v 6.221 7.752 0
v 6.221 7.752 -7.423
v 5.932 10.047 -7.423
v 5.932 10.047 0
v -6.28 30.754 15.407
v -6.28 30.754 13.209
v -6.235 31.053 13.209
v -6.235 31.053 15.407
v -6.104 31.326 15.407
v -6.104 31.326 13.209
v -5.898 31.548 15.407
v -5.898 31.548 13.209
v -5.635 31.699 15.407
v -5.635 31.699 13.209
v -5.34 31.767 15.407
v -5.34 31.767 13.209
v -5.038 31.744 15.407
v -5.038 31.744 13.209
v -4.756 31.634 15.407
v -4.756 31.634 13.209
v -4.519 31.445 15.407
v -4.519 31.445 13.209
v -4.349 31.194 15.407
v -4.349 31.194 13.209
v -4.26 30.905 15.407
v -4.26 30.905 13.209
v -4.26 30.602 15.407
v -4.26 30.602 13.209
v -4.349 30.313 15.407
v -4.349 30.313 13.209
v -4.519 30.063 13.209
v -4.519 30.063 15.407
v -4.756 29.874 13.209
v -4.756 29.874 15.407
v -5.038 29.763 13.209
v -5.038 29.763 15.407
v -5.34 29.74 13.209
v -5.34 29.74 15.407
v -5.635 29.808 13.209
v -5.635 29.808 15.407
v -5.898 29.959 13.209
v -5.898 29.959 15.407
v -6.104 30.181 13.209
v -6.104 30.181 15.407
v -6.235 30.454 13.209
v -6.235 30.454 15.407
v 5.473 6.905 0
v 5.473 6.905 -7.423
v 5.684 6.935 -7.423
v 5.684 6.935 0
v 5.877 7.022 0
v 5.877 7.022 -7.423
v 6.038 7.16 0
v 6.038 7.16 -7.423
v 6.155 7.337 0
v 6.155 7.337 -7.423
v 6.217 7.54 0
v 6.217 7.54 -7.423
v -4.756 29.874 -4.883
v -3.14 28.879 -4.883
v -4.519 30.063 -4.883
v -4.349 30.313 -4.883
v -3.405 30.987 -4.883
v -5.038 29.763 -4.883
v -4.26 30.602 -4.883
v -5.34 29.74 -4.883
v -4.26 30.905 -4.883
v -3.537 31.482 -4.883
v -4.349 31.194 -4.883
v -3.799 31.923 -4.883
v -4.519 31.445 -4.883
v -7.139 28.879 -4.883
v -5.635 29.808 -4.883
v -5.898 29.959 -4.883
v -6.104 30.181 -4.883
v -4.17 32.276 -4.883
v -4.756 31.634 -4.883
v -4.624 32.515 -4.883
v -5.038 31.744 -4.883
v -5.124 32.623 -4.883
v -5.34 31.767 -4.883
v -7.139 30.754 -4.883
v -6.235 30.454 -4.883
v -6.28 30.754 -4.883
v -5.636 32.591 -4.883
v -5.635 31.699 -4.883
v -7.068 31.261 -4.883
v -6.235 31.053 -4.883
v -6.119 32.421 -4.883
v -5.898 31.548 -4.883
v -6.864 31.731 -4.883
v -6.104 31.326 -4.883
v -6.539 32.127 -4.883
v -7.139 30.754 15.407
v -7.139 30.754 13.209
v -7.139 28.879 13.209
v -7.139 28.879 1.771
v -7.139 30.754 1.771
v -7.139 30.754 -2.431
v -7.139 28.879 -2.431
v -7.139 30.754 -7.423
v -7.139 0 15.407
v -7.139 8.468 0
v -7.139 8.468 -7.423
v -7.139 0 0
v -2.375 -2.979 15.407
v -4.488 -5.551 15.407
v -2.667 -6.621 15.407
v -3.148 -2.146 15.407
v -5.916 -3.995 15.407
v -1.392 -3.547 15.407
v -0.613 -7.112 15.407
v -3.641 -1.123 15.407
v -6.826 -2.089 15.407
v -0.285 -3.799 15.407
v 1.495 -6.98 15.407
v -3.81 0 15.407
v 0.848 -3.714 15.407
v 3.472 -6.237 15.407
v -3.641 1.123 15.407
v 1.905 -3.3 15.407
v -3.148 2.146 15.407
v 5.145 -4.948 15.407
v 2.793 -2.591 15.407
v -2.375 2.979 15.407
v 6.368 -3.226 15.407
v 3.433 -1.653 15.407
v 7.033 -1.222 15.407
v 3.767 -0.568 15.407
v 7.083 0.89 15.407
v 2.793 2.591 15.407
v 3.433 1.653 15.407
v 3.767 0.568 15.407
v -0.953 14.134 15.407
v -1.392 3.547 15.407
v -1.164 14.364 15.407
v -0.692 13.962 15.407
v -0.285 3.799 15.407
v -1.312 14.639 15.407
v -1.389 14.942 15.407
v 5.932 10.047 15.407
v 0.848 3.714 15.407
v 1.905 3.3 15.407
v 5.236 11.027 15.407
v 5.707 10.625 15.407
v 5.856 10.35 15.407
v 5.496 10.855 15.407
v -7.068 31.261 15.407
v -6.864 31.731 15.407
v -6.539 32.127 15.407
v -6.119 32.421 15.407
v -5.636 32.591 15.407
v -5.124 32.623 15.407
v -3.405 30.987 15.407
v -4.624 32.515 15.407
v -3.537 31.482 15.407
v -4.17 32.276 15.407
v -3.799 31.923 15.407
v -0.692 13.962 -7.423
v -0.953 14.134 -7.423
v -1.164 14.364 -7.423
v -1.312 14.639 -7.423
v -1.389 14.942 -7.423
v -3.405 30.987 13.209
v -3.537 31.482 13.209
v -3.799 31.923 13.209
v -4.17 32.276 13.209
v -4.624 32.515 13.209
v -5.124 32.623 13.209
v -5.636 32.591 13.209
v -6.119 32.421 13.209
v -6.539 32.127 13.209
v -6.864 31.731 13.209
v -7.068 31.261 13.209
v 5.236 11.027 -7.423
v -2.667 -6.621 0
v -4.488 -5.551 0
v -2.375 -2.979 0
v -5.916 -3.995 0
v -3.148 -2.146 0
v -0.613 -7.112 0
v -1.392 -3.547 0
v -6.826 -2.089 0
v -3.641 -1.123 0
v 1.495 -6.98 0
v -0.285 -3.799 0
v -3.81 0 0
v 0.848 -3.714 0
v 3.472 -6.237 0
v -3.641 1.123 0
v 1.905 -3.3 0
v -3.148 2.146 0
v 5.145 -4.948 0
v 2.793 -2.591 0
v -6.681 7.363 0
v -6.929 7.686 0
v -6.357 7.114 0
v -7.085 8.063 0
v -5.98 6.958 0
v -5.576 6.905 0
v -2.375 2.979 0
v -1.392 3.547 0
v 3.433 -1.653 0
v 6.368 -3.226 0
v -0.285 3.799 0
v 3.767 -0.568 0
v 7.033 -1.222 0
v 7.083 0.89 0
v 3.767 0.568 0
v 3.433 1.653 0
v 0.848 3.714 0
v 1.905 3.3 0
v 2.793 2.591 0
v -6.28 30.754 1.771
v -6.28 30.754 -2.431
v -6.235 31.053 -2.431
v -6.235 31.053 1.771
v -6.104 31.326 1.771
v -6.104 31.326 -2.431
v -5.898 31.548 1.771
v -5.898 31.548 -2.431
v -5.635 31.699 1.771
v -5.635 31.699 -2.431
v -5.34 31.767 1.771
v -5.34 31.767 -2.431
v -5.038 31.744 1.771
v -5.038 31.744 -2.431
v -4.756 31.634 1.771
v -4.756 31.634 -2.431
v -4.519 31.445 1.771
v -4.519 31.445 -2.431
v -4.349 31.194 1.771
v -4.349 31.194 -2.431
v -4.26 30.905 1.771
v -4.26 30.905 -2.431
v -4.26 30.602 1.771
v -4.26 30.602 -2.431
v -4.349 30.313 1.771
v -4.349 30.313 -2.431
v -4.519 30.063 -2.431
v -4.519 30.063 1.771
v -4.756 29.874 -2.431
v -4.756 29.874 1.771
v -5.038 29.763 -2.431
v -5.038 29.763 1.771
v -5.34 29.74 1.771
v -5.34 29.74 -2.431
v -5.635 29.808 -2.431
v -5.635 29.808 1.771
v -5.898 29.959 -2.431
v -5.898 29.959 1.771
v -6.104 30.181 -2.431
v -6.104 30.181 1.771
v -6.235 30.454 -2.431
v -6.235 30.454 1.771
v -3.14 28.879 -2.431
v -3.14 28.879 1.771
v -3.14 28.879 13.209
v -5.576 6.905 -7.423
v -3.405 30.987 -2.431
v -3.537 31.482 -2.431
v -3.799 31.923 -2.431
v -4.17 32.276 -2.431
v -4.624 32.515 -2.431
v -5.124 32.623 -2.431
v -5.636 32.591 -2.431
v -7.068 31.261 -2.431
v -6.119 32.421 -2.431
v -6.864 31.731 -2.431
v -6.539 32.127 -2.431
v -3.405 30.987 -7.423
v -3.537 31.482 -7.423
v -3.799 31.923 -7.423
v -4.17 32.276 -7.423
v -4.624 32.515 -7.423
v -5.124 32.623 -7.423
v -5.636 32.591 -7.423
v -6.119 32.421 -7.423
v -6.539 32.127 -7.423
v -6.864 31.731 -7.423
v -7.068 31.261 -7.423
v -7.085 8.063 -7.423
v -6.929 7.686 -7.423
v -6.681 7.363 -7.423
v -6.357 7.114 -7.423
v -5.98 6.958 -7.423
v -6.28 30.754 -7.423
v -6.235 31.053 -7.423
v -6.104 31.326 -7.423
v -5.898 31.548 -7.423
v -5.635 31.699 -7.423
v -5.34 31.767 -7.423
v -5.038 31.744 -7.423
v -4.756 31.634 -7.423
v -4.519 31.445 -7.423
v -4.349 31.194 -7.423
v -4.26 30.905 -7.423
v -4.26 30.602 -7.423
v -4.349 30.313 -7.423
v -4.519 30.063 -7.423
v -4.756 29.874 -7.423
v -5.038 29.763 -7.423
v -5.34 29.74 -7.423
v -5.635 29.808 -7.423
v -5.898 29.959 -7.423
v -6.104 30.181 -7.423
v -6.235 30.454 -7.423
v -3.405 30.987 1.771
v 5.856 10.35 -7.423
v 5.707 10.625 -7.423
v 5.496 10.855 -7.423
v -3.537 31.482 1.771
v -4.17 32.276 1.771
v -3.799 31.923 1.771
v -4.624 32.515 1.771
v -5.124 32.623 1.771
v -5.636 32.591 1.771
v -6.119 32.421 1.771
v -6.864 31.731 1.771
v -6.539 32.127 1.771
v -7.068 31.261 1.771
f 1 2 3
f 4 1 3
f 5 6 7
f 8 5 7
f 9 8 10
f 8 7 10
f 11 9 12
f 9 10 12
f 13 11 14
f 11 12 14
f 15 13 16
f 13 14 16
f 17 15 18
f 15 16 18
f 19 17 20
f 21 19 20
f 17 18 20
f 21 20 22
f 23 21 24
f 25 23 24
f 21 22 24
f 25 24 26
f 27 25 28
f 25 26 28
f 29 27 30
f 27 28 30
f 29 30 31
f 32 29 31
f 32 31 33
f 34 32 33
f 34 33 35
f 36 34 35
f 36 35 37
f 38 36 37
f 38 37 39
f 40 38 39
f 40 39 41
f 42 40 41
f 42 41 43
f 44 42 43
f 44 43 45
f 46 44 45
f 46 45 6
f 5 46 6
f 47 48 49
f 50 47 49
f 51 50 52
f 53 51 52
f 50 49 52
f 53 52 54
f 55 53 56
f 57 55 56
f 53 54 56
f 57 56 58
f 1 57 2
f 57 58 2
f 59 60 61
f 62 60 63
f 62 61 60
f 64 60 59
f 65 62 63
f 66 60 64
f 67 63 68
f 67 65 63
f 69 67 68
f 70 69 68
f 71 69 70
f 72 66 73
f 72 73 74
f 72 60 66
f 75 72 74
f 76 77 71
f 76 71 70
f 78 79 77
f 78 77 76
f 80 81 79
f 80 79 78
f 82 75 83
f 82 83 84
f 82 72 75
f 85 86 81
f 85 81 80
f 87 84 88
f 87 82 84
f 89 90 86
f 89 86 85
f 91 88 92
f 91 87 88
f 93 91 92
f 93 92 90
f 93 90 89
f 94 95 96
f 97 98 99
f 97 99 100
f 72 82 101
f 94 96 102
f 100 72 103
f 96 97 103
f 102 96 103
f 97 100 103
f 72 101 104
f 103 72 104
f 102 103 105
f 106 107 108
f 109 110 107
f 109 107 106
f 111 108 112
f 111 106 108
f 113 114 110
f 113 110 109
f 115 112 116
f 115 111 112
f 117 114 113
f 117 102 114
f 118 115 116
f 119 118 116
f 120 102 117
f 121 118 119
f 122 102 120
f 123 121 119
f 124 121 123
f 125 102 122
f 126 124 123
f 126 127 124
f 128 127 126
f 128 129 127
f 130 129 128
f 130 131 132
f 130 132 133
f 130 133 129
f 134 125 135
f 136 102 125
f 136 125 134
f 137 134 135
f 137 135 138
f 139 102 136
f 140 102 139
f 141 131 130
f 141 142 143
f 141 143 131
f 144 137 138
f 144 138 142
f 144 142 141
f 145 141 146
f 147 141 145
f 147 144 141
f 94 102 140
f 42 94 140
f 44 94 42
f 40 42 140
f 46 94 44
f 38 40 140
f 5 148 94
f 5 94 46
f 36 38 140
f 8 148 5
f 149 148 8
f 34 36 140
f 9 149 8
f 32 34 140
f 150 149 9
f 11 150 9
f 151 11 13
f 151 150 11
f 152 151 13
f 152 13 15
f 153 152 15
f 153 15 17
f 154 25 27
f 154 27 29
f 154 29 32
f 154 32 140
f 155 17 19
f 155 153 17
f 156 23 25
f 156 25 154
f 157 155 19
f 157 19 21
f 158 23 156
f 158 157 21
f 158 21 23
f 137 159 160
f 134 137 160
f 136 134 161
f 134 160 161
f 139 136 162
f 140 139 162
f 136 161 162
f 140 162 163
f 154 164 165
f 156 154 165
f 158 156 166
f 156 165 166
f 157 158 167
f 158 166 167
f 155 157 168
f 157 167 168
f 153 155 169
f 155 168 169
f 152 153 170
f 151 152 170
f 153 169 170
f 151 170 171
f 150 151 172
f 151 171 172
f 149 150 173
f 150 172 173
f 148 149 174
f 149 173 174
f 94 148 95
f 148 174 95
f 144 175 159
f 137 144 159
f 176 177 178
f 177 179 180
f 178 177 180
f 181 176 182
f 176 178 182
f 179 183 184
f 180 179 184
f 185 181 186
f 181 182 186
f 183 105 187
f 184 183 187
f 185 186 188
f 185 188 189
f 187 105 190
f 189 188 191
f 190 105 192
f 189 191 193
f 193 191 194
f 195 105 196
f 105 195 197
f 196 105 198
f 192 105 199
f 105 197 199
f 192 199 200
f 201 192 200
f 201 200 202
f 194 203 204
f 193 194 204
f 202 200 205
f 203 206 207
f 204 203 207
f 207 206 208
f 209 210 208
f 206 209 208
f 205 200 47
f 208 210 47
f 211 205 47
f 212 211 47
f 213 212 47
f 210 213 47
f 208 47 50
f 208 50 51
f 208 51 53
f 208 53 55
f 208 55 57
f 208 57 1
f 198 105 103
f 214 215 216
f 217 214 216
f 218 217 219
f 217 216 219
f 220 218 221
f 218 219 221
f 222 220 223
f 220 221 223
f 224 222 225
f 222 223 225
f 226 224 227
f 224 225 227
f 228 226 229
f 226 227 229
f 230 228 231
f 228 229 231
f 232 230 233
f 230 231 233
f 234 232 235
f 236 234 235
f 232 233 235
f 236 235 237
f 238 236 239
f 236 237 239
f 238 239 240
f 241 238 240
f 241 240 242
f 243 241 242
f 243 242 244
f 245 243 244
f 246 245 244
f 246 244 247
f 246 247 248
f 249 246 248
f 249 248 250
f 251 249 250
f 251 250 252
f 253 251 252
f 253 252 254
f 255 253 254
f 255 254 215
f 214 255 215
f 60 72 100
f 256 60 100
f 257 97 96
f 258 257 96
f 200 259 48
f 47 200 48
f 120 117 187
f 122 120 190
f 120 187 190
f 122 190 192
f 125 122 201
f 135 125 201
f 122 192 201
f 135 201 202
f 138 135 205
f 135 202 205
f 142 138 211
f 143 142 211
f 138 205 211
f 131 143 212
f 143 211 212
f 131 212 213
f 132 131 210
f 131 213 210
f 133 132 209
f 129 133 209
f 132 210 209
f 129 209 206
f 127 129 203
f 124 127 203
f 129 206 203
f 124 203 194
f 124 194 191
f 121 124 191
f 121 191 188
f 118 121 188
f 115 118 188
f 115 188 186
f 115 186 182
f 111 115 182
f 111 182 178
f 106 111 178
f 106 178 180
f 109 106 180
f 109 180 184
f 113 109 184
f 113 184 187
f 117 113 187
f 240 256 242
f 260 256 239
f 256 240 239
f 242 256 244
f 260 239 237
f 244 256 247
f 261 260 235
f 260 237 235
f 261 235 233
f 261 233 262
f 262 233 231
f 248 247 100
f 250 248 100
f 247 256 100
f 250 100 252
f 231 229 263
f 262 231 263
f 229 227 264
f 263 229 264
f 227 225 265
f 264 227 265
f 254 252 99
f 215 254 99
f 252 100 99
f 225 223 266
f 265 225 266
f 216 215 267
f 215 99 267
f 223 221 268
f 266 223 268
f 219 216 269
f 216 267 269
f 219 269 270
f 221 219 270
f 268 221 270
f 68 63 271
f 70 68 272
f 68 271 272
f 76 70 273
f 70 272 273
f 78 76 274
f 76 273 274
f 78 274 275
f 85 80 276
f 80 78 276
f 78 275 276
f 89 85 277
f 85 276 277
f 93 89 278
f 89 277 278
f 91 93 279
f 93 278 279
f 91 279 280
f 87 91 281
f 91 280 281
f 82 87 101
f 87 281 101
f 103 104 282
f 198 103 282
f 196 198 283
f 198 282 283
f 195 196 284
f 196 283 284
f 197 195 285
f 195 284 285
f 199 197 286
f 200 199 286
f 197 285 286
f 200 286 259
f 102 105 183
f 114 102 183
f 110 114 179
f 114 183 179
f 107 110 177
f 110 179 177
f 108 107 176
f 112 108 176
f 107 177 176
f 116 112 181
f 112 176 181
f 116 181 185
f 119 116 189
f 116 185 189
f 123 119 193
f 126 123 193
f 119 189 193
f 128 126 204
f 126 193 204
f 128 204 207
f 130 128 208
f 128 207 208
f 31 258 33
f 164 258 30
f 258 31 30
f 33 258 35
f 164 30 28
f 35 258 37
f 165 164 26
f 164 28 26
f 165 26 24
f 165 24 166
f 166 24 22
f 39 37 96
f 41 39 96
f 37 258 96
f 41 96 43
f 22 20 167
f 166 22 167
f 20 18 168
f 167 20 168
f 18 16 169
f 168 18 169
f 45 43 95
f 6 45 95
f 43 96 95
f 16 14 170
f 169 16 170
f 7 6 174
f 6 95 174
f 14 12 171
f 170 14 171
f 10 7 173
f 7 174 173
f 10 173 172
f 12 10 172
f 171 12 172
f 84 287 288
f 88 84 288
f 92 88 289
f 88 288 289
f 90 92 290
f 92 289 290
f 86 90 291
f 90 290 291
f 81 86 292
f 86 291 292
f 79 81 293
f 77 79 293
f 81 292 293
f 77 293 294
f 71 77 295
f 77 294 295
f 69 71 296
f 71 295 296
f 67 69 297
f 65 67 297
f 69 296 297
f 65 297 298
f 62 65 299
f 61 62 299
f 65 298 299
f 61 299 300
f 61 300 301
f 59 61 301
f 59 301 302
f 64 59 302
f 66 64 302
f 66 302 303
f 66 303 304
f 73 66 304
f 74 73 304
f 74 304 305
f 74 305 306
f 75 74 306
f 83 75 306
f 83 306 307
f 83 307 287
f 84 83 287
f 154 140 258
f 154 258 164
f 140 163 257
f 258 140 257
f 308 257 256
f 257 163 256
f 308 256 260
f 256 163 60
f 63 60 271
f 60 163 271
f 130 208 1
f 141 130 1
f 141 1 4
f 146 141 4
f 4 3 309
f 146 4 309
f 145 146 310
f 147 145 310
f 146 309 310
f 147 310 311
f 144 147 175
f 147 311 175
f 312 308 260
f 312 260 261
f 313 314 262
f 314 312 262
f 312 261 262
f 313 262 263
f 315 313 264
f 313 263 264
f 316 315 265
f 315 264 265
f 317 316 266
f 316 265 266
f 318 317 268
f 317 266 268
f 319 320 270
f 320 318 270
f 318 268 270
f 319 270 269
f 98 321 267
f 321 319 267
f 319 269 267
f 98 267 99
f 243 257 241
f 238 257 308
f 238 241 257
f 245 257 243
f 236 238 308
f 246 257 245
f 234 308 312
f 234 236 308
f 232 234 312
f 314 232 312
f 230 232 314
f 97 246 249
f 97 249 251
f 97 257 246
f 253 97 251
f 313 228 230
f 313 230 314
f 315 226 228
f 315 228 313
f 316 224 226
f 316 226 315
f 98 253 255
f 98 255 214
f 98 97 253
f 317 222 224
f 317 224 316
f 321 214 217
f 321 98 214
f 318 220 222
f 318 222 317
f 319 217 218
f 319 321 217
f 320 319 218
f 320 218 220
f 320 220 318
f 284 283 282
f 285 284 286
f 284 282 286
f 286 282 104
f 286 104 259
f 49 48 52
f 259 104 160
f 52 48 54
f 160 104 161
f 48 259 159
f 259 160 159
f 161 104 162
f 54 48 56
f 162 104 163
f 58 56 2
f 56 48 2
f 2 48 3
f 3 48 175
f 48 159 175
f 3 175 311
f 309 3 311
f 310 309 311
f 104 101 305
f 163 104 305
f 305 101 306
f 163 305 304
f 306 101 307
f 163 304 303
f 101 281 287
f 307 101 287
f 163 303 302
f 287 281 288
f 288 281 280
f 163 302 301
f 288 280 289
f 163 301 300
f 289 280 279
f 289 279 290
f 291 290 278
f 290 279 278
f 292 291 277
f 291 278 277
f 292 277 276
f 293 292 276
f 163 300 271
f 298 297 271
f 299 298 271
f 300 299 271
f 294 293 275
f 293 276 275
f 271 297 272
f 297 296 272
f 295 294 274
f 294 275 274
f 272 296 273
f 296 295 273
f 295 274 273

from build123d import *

# Parameters (mm, degrees)
EXTRUDE1_DEPTH = 15.407108717
EXTRUDE2_START = 7.422870335
EXTRUDE2_DEPTH = 7.422870335
SKETCH3_R      = 3.81
EXTRUDE3_DEPTH = 37.782065936
SKETCH4_R      = 1.016
EXTRUDE4_DEPTH = 41.456758632
SKETCH6_W      = 2.451904957
SKETCH6_H      = 3.748582847
SKETCH6_W_2    = 11.438391631
EXTRUDE6_DEPTH = 39.80458612


with BuildPart() as part:
    # Sketch1 → Extrude1 (new body)
    with BuildSketch(Plane.XY):
        with BuildLine():
            Line((-7.138522943, 30.753654662), (-7.138522943, 0))
            ThreePointArc((-7.138522943, 0), (0.445823167, -7.124587813), (7.08283683, 0.889905749))
            Line((7.08283683, 0.889905749), (5.932301807, 10.047113518))
            ThreePointArc((5.932301807, 10.047113518), (5.707297096, 10.62465377), (5.235742646, 11.026917691))
            Line((5.235742646, 11.026917691), (-0.692002916, 13.961994048))
            ThreePointArc((-0.692002916, 13.961994048), (-1.163557366, 14.364257969), (-1.388562077, 14.941798222))
            Line((-1.388562077, 14.941798222), (-3.404561048, 30.987308419))
            ThreePointArc((-3.404561048, 30.987308419), (-5.381286902, 32.624287275), (-7.138522943, 30.753654662))
        make_face()
    extrude(amount=EXTRUDE1_DEPTH)

    # Sketch2 → Extrude2 (add)
    with BuildSketch(Plane(origin=(0, 0, 0), x_dir=(-1, 0, 0), z_dir=(0, 0, -1)).offset(EXTRUDE2_START)):
        with BuildLine():
            Line((1.388562077, 14.941798222), (3.404561048, 30.987308419))
            ThreePointArc((3.404561048, 30.987308419), (5.381286902, 32.624287275), (7.138522943, 30.753654662))
            Line((7.138522943, 30.753654662), (7.138522943, 8.467771223))
            ThreePointArc((7.138522943, 8.467771223), (6.680781174, 7.362684837), (5.575694788, 6.904943069))
            Line((5.575694788, 6.904943069), (-5.473496233, 6.904943069))
            ThreePointArc((-5.473496233, 6.904943069), (-6.038205752, 7.159804295), (-6.220680789, 7.751880259))
            Line((-6.220680789, 7.751880259), (-5.932301807, 10.047113518))
            ThreePointArc((-5.932301807, 10.047113518), (-5.707297096, 10.62465377), (-5.235742646, 11.026917691))
            Line((-5.235742646, 11.026917691), (0.692002916, 13.961994048))
            ThreePointArc((0.692002916, 13.961994048), (1.163557366, 14.364257969), (1.388562077, 14.941798222))
        make_face()
    extrude(amount=-EXTRUDE2_DEPTH)

    # Sketch3 → Extrude3 (cut, through all)
    with BuildSketch(Plane(origin=(0, 0, 0), x_dir=(-1, 0, 0), z_dir=(0, 0, -1))):
        Circle(SKETCH3_R)
    extrude(amount=-EXTRUDE3_DEPTH, mode=Mode.SUBTRACT)

    # Sketch4 → Extrude4 (cut, through all)
    with BuildSketch(Plane(origin=(0, 0, -7.422870335), x_dir=(-1, 0, 0), z_dir=(0, 0, -1))):
        with Locations((5.264231519, 30.753654662)):
            Circle(SKETCH4_R)
    extrude(amount=-EXTRUDE4_DEPTH, mode=Mode.SUBTRACT)

    # Sketch6 → Extrude6 (cut, through all)
    with BuildSketch(Plane.ZY.offset(7.138522943)):
        with Locations((-3.656917857, 30.753654662)):
            Rectangle(SKETCH6_W, SKETCH6_H)
        with Locations((7.490088589, 30.753654662)):
            Rectangle(SKETCH6_W_2, SKETCH6_H)
    extrude(amount=-EXTRUDE6_DEPTH, mode=Mode.SUBTRACT)


solid = part.part
